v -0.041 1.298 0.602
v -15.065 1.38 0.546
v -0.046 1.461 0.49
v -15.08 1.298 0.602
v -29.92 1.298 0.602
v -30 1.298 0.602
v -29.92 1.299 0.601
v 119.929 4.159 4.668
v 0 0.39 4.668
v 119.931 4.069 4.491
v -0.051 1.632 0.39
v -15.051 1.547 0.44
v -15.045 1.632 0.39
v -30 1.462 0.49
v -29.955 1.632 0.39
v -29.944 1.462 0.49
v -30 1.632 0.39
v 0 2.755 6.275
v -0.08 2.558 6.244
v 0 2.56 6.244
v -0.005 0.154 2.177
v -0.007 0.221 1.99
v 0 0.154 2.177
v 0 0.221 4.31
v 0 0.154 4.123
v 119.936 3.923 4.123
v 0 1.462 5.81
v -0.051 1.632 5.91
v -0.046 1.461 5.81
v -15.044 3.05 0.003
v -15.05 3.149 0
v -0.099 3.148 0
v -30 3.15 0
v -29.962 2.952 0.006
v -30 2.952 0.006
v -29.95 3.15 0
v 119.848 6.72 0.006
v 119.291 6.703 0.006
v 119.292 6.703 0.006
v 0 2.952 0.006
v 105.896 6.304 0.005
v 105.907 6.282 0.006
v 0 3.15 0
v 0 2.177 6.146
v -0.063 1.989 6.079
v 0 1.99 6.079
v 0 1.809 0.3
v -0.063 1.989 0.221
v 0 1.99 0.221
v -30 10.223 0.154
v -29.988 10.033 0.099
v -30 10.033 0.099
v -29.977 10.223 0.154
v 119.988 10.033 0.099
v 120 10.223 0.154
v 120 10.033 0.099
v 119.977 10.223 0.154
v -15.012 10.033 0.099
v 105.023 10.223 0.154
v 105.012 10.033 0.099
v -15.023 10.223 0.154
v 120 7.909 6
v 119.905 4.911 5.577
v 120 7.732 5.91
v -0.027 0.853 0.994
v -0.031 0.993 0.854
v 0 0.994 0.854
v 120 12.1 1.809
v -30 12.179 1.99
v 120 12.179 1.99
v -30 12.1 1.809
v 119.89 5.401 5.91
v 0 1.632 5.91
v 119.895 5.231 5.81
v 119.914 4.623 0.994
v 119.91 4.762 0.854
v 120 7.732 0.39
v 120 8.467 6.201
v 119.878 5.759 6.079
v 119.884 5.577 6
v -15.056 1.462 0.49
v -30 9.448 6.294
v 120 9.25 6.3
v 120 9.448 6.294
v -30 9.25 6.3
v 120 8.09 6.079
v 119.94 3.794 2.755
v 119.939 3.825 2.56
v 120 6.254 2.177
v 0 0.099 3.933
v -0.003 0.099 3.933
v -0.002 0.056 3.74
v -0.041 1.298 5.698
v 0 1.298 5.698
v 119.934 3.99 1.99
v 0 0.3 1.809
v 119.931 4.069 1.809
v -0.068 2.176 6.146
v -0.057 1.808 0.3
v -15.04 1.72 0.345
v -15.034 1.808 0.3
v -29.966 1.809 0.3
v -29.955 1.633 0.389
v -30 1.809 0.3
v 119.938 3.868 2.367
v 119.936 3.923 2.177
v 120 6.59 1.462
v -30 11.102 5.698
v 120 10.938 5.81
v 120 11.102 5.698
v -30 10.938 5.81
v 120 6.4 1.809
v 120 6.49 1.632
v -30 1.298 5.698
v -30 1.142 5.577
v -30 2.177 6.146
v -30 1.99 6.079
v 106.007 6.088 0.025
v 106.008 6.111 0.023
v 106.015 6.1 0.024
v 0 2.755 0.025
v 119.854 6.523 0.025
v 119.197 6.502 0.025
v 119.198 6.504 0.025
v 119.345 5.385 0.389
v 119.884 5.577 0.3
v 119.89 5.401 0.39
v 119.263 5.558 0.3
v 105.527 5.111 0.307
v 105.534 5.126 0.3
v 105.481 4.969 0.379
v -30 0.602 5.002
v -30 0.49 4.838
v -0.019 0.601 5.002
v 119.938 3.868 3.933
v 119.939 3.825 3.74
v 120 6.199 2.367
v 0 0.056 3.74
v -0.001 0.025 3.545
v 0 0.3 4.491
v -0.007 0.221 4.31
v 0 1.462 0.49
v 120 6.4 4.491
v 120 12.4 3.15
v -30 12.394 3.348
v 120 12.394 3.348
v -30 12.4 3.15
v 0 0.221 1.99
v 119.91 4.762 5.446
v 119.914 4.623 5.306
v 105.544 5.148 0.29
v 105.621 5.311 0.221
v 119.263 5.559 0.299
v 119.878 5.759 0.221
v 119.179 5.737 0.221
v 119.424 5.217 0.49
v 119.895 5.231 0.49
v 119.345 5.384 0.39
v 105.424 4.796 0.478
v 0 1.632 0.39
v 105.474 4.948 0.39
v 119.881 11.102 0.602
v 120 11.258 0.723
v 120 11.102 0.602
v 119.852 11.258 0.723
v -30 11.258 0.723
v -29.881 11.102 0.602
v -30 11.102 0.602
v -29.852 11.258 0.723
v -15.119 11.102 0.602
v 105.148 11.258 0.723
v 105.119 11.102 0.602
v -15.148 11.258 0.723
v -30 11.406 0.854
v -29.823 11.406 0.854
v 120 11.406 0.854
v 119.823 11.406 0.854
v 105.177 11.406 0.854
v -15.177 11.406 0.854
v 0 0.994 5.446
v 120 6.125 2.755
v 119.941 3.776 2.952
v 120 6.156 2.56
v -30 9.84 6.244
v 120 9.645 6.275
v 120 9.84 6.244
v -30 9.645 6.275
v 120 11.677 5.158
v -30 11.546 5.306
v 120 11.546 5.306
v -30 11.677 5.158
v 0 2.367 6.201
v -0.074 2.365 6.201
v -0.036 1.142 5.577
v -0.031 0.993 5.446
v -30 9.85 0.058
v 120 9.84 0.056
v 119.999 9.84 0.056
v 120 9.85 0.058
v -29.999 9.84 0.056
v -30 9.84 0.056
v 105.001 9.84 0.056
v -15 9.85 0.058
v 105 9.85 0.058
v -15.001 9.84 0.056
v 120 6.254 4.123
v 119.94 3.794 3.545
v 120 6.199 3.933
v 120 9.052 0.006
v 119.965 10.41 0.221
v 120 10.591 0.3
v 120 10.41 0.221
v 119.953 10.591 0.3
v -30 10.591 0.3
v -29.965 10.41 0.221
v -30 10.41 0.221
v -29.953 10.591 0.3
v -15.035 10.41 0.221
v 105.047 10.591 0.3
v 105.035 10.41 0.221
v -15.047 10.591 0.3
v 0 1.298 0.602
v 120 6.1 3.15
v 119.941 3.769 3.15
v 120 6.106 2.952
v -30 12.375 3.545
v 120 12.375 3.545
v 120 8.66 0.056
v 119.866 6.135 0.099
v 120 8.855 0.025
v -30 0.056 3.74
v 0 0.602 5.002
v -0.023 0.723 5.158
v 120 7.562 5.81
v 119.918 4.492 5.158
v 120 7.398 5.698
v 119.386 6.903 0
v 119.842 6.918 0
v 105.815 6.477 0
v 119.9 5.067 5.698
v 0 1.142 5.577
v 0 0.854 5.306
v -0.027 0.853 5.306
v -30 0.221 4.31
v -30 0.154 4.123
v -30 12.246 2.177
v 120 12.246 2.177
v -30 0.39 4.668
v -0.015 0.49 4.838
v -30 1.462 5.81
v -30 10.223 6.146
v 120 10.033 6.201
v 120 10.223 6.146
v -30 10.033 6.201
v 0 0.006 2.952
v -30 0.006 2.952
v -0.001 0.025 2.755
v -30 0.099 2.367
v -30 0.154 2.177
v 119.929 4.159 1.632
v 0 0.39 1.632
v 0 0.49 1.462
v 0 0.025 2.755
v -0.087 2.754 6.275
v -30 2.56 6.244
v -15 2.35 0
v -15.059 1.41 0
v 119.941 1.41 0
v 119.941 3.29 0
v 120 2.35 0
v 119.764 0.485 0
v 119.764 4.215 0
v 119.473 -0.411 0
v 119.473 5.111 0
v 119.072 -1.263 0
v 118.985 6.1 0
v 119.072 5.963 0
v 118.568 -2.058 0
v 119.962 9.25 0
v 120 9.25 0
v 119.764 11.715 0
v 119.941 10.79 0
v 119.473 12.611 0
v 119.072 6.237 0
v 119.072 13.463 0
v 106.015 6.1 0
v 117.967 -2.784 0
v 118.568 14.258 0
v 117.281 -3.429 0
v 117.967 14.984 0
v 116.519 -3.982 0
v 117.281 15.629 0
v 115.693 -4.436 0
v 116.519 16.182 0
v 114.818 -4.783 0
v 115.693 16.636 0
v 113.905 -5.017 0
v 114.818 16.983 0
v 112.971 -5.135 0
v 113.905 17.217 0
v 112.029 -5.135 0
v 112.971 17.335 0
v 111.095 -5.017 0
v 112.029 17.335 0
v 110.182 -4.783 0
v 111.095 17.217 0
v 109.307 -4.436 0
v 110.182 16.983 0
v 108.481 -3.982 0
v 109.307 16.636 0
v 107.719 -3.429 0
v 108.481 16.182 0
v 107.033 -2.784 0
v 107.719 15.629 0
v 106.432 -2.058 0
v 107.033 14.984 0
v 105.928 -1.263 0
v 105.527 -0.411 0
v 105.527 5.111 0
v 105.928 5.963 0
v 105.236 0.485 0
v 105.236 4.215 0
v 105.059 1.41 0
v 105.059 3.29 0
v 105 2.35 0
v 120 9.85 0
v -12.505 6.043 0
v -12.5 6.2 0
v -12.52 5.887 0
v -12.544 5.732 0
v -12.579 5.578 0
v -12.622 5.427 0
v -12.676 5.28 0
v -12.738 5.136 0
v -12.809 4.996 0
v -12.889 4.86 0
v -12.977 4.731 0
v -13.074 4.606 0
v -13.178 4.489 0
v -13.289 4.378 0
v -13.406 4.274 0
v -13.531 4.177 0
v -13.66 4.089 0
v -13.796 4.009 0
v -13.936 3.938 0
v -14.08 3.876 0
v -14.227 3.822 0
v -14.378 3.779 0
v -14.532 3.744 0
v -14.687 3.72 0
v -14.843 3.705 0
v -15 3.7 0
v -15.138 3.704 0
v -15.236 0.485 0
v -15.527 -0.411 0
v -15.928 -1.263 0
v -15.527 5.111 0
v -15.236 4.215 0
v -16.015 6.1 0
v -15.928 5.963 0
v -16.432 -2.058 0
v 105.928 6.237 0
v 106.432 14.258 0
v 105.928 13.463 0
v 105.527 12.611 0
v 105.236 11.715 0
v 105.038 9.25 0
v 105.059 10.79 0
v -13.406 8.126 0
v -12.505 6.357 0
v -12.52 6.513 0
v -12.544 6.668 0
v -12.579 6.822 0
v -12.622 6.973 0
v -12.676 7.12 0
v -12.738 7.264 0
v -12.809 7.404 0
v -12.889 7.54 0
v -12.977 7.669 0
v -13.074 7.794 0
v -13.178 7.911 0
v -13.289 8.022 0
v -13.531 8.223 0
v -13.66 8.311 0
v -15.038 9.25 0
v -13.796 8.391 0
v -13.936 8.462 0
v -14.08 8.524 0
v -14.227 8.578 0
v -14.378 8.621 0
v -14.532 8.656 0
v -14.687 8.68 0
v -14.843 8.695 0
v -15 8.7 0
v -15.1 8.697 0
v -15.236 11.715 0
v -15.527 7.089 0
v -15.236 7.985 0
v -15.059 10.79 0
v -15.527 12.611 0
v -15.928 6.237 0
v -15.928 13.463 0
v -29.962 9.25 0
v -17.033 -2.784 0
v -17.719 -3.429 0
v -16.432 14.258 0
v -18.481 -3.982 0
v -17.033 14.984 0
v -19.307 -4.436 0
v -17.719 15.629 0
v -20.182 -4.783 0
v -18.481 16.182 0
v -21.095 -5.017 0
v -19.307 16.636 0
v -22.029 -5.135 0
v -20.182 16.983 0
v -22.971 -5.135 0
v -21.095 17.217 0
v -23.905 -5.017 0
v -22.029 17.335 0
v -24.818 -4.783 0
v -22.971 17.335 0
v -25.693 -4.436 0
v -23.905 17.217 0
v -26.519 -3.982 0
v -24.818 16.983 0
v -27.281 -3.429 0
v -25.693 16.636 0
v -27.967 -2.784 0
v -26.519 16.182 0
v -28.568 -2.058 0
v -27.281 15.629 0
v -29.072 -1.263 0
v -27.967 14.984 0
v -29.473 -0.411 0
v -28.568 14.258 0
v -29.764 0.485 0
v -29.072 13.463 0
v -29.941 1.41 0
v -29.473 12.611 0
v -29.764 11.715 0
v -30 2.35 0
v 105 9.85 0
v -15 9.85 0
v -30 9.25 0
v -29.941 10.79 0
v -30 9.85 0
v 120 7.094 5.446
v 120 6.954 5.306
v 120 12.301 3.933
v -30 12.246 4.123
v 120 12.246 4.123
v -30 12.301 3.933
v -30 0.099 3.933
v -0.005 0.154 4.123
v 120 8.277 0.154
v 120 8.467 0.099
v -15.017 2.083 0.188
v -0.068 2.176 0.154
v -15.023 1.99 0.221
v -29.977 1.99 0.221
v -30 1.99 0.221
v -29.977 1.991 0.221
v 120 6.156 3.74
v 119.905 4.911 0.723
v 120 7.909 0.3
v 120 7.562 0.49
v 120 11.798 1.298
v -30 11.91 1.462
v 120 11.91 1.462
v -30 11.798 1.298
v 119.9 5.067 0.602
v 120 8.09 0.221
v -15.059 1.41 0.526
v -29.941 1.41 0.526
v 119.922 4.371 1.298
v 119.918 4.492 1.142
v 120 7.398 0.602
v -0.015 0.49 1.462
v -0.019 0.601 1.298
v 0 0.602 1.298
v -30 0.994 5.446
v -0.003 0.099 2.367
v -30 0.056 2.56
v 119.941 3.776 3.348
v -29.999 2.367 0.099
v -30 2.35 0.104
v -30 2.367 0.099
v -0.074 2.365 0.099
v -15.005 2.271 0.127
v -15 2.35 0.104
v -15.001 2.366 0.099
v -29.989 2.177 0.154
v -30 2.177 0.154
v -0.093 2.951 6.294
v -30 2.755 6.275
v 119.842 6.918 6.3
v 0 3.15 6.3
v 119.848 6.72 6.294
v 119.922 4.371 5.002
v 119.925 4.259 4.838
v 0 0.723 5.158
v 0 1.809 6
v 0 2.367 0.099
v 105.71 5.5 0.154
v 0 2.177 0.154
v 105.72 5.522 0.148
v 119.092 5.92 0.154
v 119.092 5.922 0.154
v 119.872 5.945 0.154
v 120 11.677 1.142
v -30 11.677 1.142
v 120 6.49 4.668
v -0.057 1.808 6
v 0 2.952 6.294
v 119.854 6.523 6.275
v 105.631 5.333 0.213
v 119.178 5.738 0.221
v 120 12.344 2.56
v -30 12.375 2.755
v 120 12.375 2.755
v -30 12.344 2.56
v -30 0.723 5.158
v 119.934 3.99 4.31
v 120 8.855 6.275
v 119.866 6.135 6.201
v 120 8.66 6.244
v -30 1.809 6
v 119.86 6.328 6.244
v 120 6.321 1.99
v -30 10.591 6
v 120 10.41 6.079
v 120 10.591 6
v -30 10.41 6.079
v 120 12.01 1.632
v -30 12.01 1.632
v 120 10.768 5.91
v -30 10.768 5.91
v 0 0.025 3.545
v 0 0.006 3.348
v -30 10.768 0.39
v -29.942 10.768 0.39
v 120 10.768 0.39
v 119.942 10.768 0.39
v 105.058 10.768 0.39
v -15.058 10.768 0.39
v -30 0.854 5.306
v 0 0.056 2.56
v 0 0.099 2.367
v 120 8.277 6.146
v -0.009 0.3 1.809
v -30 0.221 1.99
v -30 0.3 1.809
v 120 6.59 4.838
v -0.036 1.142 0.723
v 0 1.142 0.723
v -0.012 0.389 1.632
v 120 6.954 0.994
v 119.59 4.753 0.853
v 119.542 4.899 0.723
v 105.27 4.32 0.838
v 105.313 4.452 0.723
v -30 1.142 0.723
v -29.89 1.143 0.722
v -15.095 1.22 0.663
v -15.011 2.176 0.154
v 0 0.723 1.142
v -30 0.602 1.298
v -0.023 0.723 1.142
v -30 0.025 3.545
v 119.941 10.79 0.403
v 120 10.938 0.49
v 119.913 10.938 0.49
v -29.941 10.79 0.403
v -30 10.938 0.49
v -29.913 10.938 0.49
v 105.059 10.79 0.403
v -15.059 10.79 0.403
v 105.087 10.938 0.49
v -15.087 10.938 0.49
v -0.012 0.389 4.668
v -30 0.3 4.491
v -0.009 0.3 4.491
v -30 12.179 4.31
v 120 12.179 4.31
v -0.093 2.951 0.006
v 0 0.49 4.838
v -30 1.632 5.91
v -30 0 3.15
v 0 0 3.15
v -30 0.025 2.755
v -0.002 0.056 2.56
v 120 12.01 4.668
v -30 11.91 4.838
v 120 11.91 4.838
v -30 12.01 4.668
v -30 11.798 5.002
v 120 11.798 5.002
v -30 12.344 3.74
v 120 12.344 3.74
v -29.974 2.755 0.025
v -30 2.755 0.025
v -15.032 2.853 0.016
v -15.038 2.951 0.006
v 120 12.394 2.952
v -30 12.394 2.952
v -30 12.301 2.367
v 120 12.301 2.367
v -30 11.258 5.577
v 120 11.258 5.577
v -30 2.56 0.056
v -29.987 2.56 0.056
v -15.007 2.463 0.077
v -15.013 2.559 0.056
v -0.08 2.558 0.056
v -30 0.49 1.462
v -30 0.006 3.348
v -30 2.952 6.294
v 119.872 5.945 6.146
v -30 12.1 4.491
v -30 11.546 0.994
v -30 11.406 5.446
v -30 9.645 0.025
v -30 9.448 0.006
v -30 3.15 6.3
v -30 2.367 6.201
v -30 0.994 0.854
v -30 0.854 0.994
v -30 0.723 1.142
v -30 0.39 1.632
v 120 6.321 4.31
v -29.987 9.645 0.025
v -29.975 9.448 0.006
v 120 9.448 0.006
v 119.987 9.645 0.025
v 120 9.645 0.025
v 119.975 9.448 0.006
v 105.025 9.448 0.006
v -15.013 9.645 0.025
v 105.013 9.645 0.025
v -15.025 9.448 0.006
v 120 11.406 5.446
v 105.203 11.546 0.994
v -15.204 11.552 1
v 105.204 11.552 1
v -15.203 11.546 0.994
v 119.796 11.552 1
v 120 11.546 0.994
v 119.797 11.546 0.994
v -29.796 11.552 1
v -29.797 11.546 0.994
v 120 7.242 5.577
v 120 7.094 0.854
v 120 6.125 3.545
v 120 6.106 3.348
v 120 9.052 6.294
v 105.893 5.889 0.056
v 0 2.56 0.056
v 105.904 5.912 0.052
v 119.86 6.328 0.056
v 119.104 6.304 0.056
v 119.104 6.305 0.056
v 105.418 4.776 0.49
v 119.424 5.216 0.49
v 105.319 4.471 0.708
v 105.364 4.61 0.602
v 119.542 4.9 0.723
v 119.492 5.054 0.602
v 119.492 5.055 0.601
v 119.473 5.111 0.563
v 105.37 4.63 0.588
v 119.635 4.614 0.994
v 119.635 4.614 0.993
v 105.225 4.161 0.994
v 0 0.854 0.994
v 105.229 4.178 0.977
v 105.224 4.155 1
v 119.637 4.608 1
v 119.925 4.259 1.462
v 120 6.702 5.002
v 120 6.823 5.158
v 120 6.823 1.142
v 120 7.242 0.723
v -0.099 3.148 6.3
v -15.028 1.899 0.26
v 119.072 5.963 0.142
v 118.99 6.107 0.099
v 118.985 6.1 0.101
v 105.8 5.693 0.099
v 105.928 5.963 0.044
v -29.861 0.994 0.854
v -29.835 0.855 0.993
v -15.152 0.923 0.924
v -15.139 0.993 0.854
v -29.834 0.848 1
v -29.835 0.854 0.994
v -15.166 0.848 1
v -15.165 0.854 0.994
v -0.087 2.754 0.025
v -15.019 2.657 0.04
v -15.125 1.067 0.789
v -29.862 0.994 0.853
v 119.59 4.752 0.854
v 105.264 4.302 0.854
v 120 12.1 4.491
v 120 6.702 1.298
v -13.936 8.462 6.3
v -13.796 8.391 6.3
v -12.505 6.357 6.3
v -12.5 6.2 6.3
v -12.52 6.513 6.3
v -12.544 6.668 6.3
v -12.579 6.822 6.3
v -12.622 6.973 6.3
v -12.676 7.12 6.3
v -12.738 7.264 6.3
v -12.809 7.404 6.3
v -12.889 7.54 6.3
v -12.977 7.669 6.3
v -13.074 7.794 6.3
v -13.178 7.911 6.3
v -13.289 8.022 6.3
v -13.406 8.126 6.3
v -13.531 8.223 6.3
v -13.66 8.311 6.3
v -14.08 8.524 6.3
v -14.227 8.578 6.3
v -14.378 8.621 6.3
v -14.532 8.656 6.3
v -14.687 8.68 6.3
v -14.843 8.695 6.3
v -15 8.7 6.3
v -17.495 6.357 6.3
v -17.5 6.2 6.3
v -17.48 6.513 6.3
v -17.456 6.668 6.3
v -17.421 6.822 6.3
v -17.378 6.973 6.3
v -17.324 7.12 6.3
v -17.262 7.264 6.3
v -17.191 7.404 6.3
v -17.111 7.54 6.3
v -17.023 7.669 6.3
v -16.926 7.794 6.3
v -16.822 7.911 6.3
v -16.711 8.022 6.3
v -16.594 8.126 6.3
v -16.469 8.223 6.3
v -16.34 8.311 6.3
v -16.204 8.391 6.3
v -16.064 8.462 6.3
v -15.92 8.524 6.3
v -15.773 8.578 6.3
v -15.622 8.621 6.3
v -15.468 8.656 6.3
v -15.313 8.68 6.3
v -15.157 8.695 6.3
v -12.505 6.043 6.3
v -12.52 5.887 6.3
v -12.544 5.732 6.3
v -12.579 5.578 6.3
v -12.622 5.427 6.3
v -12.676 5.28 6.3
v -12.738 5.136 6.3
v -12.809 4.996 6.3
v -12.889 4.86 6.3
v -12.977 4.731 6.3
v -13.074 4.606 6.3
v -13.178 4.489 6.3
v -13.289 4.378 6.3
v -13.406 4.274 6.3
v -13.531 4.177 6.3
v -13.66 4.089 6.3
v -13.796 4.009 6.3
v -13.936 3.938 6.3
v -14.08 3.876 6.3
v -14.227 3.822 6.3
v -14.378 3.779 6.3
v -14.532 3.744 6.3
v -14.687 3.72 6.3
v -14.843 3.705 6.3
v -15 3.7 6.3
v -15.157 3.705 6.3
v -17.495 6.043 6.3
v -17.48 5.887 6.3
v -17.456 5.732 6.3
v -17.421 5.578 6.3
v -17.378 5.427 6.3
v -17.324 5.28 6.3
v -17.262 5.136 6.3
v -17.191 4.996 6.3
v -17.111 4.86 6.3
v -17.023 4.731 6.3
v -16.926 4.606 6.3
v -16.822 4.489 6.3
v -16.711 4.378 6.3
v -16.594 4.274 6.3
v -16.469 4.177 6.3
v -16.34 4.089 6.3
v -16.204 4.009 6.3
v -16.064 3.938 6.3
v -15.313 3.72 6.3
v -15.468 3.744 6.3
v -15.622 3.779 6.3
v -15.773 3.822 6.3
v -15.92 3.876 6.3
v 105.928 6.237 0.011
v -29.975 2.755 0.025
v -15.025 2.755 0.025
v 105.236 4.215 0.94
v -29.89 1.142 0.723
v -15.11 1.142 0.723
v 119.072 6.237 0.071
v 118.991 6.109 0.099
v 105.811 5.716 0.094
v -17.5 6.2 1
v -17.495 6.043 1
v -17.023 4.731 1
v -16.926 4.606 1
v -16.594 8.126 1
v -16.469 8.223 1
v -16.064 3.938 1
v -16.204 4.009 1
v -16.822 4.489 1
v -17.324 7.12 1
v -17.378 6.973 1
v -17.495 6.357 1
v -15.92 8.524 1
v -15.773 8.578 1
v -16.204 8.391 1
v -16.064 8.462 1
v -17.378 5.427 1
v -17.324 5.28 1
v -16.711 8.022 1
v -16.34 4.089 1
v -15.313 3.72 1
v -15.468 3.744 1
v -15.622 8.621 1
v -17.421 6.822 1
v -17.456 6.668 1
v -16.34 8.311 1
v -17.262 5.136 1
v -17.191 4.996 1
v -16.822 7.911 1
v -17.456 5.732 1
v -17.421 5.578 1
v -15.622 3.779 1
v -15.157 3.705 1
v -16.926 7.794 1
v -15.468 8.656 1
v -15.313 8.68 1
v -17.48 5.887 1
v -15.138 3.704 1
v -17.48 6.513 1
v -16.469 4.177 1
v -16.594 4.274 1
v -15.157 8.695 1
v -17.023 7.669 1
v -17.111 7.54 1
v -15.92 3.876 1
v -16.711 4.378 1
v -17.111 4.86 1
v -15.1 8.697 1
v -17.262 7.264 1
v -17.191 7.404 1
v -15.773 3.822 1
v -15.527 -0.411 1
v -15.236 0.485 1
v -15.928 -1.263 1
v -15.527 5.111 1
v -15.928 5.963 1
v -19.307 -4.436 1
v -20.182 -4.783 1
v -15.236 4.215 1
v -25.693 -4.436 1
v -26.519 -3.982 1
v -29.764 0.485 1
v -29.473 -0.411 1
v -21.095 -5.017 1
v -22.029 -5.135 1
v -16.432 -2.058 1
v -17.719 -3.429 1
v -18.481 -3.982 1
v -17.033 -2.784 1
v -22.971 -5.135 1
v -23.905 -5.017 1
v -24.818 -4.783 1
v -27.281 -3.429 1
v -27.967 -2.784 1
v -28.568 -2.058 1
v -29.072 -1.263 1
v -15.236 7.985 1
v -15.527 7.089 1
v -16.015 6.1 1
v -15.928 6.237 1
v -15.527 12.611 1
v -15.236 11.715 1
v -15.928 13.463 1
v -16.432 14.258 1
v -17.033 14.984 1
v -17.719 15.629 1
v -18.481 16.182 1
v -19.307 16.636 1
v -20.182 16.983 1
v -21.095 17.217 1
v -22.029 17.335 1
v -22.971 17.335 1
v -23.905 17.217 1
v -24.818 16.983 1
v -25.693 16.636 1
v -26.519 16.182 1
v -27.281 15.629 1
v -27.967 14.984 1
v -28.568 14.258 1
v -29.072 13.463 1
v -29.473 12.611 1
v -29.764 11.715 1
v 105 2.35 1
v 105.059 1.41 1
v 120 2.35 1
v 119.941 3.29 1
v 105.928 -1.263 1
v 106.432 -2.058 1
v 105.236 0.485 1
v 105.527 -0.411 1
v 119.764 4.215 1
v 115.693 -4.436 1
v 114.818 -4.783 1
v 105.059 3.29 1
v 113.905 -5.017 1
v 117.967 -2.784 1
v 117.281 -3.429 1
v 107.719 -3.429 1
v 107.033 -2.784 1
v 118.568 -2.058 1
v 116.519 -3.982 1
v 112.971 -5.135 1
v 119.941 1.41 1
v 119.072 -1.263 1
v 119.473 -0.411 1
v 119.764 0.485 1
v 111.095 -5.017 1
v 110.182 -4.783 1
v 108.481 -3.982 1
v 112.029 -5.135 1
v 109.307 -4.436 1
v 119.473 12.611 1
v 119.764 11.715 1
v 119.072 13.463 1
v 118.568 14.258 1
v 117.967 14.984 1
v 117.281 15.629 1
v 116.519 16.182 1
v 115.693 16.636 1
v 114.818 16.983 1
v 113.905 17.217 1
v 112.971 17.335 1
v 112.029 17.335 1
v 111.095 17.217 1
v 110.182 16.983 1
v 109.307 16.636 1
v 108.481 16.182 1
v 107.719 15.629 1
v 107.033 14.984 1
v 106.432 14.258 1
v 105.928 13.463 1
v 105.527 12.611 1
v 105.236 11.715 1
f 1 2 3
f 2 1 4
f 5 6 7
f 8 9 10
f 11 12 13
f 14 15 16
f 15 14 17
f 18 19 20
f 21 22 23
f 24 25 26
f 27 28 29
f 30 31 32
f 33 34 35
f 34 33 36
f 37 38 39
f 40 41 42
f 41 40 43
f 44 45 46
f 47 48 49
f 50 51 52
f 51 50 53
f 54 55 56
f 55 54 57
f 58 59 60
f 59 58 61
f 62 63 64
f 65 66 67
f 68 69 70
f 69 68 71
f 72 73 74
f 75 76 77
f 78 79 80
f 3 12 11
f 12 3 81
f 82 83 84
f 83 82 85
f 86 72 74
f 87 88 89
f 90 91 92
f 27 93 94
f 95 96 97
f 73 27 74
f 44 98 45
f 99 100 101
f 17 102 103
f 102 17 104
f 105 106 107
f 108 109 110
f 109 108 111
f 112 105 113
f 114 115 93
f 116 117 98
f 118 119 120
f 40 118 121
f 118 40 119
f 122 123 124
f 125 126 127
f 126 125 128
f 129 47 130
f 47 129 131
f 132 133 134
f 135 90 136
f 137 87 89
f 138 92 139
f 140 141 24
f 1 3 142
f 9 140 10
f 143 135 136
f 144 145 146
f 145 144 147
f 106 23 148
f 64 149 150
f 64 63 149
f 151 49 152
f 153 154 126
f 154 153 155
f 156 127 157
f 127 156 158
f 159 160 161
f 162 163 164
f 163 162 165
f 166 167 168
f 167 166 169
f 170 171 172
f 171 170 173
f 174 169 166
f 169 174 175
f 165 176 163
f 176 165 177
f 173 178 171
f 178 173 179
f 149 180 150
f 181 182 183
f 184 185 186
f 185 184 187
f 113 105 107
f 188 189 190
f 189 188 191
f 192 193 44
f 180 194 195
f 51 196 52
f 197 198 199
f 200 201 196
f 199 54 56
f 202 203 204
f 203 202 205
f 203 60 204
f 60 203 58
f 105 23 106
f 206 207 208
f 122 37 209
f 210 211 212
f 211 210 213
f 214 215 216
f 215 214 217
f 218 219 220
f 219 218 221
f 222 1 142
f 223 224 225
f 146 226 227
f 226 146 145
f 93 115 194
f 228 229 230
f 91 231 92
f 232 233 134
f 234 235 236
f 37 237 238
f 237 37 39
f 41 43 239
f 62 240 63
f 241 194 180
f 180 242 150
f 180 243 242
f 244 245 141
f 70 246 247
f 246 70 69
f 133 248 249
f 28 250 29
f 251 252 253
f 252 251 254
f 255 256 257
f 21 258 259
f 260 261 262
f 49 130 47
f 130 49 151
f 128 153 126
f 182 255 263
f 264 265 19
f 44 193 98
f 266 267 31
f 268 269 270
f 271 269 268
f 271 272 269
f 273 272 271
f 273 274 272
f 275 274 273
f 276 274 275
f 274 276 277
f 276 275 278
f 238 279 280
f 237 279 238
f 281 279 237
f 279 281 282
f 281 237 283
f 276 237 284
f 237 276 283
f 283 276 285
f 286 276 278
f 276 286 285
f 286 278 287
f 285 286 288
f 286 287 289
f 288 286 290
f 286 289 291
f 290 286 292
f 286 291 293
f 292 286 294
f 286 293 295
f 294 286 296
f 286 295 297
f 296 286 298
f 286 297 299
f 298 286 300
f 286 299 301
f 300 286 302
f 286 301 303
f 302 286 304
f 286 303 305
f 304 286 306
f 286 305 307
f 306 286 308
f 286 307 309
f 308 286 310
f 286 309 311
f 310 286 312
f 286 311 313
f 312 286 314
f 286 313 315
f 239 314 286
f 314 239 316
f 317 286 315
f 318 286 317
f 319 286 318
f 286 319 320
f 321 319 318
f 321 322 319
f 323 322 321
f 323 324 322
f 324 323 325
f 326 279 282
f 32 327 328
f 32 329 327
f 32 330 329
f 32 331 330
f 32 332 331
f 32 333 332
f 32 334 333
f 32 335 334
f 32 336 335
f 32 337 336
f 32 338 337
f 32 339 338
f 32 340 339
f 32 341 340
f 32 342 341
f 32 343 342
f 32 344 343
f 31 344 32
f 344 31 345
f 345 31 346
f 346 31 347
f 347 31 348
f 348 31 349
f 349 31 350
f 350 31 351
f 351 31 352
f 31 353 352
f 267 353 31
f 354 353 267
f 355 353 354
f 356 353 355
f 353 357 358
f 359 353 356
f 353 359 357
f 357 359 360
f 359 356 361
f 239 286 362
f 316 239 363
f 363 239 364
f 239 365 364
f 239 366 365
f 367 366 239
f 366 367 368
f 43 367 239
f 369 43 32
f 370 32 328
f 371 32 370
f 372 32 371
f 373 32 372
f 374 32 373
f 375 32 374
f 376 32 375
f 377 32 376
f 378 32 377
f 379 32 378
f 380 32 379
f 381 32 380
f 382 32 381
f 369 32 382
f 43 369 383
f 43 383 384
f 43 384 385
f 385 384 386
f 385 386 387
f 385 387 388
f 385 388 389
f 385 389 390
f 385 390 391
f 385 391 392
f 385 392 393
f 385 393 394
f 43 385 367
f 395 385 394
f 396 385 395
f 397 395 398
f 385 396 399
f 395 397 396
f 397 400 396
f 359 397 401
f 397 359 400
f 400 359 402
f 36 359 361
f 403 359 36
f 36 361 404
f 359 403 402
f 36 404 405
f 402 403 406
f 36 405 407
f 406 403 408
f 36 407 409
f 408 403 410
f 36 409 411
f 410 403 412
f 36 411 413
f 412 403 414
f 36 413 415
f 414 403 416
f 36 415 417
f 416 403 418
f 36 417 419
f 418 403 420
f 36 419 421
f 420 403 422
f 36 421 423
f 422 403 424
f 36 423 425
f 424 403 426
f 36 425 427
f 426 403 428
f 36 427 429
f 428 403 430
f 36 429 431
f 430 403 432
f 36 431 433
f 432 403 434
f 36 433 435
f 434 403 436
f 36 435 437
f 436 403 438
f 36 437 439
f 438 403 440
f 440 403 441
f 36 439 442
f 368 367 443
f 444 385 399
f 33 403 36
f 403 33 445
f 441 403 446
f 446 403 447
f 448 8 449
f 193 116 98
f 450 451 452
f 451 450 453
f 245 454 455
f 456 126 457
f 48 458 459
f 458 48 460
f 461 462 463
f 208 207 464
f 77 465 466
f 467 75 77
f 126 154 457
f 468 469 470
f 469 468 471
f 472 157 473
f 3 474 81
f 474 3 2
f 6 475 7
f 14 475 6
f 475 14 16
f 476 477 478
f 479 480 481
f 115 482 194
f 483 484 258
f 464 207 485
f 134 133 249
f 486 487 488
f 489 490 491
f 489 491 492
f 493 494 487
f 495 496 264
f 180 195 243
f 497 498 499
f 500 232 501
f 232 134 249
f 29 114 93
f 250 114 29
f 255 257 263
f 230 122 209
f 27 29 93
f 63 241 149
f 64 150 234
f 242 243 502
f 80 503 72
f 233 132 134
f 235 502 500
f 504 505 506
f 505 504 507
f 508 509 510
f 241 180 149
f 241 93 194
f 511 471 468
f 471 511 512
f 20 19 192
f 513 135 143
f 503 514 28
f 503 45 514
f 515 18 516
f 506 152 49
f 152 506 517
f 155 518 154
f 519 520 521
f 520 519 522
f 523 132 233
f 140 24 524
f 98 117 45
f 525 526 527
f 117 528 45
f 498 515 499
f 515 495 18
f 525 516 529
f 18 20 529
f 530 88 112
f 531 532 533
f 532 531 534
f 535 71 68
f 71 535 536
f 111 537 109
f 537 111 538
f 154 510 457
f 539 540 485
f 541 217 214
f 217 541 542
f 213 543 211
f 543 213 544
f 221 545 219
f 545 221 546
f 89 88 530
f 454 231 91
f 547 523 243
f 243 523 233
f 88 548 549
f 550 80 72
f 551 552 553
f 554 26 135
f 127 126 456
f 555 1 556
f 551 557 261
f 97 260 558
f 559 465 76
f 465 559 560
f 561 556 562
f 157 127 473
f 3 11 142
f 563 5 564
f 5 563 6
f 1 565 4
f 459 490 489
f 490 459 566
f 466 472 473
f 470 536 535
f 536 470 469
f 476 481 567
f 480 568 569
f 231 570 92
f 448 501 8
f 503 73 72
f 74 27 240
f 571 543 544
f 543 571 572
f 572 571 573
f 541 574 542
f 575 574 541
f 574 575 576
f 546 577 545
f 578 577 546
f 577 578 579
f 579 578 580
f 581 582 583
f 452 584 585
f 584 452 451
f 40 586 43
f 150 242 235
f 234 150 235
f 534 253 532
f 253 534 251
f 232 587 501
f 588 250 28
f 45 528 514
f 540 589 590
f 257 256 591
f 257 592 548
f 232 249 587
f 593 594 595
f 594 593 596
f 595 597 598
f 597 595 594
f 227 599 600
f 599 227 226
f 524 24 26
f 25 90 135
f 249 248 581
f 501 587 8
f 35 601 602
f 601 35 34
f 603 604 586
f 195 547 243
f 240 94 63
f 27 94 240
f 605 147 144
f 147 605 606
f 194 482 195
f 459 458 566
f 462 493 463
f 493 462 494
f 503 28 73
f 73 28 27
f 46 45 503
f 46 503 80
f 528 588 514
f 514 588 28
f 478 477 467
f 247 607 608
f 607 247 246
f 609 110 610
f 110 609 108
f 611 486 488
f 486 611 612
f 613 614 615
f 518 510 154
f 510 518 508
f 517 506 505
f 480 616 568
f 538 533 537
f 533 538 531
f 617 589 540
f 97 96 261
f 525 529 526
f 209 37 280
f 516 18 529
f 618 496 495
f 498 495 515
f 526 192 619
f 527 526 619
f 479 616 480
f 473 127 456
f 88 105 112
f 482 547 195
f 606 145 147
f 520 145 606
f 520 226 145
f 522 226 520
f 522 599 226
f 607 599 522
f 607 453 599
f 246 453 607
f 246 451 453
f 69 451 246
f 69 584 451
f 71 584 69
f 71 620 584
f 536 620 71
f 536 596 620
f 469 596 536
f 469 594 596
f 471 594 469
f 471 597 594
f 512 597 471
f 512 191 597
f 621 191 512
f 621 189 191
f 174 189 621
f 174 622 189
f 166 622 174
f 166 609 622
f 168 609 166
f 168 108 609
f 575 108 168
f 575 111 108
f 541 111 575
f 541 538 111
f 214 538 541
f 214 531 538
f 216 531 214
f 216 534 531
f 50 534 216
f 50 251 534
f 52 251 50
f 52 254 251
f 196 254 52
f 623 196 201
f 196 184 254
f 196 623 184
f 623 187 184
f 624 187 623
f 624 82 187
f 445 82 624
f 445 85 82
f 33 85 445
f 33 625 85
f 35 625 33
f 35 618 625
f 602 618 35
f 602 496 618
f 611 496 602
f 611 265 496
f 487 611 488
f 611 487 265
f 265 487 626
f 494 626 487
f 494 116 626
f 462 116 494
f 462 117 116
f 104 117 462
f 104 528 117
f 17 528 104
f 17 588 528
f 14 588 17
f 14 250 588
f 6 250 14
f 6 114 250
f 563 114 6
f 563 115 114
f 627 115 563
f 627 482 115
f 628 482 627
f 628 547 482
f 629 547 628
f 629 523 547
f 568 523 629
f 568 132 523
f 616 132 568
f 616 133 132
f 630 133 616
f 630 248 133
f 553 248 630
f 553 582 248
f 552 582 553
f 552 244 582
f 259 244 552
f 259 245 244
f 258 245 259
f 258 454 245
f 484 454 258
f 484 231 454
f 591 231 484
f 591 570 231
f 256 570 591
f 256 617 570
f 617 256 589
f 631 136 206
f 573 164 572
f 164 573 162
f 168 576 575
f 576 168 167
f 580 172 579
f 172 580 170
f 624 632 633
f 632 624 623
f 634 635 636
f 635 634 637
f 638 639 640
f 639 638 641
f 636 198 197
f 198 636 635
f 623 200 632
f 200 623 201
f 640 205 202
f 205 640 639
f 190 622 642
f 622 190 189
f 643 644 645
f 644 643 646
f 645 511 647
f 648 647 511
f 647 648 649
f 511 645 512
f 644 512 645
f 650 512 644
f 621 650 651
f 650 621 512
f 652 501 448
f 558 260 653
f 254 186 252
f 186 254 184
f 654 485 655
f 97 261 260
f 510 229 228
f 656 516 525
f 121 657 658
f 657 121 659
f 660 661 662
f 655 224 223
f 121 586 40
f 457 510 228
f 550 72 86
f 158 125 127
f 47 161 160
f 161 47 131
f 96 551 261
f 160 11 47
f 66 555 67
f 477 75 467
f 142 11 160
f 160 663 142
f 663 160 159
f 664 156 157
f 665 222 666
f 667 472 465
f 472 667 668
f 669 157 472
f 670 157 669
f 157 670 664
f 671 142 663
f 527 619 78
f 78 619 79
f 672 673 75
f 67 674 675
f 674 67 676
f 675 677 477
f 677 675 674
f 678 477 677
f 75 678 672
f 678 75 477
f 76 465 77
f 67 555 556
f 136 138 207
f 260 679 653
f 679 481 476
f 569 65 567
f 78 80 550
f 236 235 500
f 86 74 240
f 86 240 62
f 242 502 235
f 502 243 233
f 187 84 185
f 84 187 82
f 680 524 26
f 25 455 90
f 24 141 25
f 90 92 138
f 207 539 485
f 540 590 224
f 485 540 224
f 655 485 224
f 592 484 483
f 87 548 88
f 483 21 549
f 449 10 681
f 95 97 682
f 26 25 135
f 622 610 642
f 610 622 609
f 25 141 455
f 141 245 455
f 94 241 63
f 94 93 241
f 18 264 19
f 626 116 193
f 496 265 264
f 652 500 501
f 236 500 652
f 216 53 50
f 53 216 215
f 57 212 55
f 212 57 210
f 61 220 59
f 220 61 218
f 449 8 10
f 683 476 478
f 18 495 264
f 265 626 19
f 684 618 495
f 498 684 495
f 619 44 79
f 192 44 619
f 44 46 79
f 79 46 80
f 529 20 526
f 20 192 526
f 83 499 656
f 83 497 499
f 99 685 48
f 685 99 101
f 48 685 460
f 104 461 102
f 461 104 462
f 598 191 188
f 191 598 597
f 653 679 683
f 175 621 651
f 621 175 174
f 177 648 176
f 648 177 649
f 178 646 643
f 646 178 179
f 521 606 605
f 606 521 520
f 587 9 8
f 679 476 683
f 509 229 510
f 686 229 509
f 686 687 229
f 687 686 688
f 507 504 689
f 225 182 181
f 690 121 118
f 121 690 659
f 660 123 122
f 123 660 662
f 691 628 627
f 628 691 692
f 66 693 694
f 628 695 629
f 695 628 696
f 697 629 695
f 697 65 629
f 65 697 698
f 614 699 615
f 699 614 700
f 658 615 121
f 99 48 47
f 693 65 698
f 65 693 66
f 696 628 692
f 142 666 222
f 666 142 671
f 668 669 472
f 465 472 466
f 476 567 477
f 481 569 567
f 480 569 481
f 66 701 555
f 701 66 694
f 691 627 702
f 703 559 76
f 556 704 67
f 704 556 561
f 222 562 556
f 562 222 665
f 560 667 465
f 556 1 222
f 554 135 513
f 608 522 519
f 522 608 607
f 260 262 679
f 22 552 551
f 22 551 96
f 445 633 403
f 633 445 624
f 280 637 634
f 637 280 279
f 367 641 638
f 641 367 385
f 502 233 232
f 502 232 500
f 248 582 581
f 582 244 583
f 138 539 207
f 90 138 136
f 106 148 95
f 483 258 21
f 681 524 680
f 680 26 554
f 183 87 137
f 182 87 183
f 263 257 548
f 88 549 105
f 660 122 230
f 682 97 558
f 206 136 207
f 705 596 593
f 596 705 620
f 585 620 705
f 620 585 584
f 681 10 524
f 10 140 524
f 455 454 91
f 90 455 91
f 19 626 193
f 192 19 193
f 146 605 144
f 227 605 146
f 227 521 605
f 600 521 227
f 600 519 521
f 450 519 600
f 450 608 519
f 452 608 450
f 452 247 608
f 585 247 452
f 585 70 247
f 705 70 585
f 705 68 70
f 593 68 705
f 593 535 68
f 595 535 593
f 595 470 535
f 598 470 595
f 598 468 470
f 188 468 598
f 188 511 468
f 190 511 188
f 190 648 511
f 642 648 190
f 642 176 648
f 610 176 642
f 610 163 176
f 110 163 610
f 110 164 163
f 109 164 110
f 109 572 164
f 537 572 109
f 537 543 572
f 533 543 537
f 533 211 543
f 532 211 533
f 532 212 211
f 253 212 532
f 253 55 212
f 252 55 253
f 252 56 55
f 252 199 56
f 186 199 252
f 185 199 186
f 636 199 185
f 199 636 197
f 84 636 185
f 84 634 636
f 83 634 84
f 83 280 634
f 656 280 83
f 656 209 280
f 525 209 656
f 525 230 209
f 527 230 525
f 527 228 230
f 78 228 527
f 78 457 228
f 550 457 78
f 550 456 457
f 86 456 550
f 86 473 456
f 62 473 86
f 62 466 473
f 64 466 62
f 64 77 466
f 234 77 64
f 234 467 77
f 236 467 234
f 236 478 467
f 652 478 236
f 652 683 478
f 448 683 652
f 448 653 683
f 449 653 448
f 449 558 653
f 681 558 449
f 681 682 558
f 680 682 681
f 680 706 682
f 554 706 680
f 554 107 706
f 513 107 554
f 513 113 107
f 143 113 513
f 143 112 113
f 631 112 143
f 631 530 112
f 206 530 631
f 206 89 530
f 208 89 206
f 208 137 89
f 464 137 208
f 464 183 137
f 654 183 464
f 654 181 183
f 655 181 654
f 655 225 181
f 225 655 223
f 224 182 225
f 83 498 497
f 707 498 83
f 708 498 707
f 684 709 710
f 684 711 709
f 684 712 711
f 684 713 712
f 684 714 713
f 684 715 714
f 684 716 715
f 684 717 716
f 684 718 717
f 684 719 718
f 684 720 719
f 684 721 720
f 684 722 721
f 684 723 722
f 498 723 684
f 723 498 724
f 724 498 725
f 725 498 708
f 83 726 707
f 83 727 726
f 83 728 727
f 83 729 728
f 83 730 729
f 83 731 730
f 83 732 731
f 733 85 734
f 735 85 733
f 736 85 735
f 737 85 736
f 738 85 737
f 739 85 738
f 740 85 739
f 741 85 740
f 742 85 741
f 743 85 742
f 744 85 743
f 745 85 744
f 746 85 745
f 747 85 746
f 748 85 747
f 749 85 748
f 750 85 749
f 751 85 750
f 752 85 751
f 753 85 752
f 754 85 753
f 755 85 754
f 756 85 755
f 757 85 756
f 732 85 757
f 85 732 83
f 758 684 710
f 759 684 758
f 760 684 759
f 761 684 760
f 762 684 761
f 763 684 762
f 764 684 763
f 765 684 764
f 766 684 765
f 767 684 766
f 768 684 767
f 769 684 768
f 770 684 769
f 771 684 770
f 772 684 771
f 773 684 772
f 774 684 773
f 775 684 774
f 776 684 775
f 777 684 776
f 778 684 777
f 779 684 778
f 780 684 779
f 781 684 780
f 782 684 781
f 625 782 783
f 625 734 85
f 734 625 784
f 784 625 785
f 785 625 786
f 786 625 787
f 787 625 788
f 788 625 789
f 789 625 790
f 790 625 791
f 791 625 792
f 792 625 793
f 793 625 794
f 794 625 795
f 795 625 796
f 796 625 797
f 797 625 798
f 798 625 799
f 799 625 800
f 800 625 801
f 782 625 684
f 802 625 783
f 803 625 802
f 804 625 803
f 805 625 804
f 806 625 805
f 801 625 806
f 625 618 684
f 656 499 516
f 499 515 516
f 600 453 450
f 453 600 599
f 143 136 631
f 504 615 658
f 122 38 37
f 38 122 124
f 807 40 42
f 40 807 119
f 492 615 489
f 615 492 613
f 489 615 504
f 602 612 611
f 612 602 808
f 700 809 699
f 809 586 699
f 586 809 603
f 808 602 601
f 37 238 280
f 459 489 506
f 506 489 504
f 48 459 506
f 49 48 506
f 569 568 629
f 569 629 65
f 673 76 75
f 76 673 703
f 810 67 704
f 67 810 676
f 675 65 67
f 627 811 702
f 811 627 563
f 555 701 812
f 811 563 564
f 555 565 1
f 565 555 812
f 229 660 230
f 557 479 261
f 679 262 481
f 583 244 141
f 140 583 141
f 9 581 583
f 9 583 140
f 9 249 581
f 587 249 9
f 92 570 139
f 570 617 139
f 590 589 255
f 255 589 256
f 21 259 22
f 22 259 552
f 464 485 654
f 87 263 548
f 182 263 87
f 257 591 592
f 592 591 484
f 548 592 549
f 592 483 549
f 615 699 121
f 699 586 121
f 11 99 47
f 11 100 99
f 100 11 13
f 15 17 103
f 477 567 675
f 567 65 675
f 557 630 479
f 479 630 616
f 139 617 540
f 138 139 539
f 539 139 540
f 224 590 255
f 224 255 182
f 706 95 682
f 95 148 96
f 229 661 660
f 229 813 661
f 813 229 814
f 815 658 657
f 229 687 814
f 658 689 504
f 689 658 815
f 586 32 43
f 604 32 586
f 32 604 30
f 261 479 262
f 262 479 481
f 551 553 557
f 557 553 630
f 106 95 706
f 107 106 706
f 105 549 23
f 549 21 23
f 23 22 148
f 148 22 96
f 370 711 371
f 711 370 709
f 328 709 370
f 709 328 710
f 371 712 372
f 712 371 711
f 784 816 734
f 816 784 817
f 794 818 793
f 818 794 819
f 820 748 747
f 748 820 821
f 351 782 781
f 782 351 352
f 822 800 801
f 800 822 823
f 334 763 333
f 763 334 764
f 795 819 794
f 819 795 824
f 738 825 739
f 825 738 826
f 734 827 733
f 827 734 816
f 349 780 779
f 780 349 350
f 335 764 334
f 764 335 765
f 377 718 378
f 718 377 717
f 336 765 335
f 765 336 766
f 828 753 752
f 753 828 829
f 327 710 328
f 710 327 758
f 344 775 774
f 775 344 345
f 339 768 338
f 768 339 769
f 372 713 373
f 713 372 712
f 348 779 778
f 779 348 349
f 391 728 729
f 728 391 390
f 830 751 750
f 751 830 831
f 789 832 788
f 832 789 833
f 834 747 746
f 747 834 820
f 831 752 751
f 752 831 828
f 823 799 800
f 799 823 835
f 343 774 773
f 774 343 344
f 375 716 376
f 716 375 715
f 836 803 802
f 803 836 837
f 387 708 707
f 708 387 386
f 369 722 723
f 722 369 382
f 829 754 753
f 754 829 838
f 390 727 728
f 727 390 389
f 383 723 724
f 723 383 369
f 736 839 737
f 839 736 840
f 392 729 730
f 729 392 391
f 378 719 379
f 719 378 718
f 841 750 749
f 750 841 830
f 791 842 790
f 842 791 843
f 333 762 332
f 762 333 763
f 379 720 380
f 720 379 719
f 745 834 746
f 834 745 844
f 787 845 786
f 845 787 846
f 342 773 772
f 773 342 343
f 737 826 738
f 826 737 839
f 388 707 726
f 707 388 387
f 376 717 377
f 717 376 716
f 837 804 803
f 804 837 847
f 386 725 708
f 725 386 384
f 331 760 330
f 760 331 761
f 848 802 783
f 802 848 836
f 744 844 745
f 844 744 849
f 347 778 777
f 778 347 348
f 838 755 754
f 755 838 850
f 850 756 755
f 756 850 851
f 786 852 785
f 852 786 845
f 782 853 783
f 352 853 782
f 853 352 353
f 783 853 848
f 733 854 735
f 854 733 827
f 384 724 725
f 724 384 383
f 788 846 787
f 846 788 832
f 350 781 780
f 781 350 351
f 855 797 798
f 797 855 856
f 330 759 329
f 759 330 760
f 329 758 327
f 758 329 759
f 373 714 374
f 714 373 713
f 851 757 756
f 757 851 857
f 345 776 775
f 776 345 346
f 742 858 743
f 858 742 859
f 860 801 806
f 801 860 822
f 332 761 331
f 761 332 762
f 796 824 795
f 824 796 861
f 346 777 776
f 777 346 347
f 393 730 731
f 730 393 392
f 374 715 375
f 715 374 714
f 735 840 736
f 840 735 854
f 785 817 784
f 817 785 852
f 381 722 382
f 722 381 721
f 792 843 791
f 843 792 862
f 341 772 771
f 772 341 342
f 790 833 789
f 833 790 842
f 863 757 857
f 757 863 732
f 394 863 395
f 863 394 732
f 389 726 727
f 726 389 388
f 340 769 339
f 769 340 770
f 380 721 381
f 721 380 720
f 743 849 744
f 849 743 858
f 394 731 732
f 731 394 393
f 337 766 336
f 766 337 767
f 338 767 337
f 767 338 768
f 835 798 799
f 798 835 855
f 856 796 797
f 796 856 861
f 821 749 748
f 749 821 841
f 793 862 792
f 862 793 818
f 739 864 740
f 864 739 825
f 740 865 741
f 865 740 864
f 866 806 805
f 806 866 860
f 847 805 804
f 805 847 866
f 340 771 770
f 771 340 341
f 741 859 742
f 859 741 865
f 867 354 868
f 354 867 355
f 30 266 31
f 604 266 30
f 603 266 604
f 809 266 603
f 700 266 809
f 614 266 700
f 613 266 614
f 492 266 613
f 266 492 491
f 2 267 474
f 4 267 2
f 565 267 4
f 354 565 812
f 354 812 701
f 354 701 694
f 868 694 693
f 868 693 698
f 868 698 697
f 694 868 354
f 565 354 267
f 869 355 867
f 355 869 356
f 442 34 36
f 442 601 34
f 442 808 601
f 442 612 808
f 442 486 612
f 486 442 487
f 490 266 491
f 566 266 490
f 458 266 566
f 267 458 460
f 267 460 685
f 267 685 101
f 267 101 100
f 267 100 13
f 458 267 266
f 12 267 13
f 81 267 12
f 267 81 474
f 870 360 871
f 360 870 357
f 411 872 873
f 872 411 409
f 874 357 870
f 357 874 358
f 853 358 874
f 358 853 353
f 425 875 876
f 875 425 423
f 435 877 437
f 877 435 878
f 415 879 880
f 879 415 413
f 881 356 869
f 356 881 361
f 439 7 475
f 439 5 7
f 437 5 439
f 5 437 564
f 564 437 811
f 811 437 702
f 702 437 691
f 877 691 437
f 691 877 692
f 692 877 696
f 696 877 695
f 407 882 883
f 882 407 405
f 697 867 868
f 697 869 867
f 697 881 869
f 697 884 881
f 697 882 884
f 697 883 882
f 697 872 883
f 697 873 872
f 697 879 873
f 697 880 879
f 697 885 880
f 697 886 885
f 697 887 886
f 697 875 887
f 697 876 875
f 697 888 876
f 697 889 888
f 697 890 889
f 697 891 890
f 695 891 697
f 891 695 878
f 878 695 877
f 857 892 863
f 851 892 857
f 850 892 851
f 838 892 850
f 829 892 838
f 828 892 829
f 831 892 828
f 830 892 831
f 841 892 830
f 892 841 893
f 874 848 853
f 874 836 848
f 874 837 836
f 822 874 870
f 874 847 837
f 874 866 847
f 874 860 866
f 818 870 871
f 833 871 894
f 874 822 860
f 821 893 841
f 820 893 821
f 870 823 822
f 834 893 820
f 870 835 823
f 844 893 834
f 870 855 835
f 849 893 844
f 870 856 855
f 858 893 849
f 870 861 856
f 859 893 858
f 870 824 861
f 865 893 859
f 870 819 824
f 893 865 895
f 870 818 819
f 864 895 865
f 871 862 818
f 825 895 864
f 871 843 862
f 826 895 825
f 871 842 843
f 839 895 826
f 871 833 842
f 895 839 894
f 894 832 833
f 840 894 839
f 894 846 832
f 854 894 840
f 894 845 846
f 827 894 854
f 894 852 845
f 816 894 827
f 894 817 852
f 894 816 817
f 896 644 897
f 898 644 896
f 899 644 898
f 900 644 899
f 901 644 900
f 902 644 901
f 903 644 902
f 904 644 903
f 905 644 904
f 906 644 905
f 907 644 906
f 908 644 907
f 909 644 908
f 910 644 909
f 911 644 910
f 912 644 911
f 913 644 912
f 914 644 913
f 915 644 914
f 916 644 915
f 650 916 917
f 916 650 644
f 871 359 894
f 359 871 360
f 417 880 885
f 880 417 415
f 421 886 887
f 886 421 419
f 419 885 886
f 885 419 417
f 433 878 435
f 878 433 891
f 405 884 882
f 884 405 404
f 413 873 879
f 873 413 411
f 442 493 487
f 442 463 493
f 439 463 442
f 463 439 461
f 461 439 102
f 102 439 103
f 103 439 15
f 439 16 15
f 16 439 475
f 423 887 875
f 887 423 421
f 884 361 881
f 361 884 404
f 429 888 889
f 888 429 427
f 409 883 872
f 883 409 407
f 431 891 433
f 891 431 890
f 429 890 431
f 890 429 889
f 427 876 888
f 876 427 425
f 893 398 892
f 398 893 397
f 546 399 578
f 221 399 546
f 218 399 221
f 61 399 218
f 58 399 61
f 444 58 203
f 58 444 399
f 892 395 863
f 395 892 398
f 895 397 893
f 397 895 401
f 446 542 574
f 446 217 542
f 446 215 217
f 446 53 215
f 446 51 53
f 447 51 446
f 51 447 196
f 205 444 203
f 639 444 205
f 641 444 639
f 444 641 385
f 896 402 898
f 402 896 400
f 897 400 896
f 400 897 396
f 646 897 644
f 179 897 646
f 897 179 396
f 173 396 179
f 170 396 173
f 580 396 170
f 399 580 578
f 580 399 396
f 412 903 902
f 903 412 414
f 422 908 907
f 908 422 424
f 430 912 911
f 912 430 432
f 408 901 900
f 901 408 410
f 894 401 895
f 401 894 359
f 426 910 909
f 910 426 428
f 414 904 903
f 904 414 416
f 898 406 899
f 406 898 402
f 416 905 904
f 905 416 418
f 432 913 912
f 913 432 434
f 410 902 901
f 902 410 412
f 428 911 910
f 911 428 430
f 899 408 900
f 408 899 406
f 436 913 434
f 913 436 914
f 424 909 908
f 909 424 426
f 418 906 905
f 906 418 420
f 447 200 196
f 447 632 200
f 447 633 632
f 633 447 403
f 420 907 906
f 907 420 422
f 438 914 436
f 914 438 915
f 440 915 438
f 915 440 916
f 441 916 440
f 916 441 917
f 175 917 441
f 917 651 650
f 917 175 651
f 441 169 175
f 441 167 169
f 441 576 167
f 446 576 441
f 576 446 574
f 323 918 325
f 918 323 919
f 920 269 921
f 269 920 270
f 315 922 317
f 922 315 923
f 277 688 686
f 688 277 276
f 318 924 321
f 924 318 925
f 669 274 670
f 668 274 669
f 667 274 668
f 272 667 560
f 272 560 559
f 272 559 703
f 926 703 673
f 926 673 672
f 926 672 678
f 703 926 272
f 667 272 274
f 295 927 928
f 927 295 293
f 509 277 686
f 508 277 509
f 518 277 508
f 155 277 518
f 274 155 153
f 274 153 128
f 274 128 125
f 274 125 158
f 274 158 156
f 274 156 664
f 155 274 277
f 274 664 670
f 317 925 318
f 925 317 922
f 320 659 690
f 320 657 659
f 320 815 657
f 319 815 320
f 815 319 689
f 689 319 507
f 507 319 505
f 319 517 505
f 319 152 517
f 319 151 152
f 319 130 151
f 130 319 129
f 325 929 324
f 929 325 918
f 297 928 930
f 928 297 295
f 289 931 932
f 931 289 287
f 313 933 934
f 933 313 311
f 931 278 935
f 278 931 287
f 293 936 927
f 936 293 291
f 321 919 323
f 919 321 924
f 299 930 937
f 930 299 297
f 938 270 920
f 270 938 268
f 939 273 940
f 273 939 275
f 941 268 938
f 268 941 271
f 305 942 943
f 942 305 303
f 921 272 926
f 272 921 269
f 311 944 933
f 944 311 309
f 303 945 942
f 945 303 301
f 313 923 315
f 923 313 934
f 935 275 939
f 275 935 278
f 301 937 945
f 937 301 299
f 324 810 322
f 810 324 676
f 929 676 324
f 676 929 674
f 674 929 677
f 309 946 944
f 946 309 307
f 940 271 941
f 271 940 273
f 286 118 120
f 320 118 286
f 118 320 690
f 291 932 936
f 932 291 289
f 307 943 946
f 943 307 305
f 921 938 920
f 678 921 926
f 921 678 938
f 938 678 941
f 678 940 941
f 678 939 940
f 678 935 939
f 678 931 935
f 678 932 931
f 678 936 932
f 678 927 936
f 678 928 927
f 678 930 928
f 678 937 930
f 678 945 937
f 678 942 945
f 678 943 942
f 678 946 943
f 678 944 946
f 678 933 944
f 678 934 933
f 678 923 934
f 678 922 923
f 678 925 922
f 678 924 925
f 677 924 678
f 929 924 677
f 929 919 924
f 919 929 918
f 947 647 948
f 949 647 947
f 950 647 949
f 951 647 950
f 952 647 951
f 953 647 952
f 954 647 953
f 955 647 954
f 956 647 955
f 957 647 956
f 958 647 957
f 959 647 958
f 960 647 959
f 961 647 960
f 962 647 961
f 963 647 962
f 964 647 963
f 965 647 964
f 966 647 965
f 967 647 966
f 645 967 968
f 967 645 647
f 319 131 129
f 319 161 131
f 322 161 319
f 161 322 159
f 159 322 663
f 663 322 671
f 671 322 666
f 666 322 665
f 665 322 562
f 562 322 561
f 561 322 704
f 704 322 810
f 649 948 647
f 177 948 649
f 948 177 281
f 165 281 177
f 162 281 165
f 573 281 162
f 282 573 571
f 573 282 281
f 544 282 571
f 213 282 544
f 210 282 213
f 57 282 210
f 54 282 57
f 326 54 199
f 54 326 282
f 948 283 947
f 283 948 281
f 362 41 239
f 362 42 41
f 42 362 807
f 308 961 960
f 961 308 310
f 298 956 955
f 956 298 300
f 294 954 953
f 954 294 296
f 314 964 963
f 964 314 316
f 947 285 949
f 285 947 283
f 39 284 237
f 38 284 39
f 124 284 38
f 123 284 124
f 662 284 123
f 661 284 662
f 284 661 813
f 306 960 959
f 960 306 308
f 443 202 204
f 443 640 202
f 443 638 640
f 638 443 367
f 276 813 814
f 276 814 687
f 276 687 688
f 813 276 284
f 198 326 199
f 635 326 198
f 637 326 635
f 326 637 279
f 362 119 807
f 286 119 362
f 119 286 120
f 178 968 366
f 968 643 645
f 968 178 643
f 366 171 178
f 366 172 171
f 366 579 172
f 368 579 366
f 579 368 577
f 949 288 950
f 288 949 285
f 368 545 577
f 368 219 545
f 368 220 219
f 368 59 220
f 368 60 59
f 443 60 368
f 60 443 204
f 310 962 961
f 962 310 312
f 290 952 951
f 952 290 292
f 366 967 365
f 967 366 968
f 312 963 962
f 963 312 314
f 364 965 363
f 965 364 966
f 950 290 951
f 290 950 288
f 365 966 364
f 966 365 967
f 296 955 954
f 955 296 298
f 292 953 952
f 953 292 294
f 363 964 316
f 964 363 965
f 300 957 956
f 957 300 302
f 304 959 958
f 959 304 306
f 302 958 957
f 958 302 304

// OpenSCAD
////////////////////////////////////////////////
///////wedge for removing MT tapers//////
/*author:Rudiger Vanden Driessche
ruudoleo@skynet.be
date:10/09/2015
ABS   print with 100% innfill

about tapers:
http://www.beautifuliron.com/mttaper.htm
Had to replace the head of my drilling machine, but the taper was lodged after 20 years nonuse. 
*/
/*//parameters//////*/
/* [Wedge]*/
Wedgelenght=150;
Wedgeshaft=30;
Wedgewidth=6.3;//[5.2:MT1,6.3:MT2,7.9:MT3,11.9:MT4,15.9:MT5]
Rounding=true;
Hole=5;
taperw=10;
lenghtpercent=50;
slopepercent=4;
/* [Antiwarpears]*/
eardia=15;
earh=1;
/* [Hidden]*/
safety=0.1;

space=taperw-Wedgewidth;
slope=Wedgelenght-Wedgeshaft;
a1=space-(lenghtpercent/100*slope*slopepercent/100);
a2=space+(1-lenghtpercent/100)*slope*slopepercent/100;
angle=slopepercent/100*45;
echo(a1,a2);

difference(){
hull(){
    
    //shaft
    translate([0,Wedgewidth/2,Wedgewidth/2]){
rotate(-90,[0,1,0]){
cylinder(d=Wedgewidth,h=Wedgeshaft,$fn=100);
}//end rotate
}//end translate


//straight end
translate([slope,Wedgewidth/2+a2,Wedgewidth/2]){
rotate(-90,[0,1,0]){
cylinder(d=Wedgewidth,h=Wedgeshaft+slope,$fn=100);
 }//end rotate
}//end translate 
//sloped end
rotate(angle,[0,0,1]){
translate([0,Wedgewidth/2,Wedgewidth/2]){
    rotate(90,[0,1,0]){
      cylinder(d=Wedgewidth,h=slope,,$fn=100);
    }//end rotate
    }//end translate
}//end rotate

}//end hull
//bore
translate([-Wedgeshaft/2,Wedgewidth/2+a2/2,-safety/2])
    cylinder(d=Hole,h=Wedgewidth+safety,$fn=100);
}//end difference
//ears
translate([0.5*Wedgelenght-Wedgeshaft,a2,0.5*earh]) {
  antiwarpears(eardia,earh,Wedgelenght-eardia,0.5*eardia);

}//end translate
module antiwarpears(dia,h,xd,yd){
	for(x=[-1,1], y=[-1,1]) 
       {
		translate([xd/2*x,yd/2*y,0]) 
            cylinder(d=dia,h=1,center=true,$fn=50);
       }//end for
   }//end module

